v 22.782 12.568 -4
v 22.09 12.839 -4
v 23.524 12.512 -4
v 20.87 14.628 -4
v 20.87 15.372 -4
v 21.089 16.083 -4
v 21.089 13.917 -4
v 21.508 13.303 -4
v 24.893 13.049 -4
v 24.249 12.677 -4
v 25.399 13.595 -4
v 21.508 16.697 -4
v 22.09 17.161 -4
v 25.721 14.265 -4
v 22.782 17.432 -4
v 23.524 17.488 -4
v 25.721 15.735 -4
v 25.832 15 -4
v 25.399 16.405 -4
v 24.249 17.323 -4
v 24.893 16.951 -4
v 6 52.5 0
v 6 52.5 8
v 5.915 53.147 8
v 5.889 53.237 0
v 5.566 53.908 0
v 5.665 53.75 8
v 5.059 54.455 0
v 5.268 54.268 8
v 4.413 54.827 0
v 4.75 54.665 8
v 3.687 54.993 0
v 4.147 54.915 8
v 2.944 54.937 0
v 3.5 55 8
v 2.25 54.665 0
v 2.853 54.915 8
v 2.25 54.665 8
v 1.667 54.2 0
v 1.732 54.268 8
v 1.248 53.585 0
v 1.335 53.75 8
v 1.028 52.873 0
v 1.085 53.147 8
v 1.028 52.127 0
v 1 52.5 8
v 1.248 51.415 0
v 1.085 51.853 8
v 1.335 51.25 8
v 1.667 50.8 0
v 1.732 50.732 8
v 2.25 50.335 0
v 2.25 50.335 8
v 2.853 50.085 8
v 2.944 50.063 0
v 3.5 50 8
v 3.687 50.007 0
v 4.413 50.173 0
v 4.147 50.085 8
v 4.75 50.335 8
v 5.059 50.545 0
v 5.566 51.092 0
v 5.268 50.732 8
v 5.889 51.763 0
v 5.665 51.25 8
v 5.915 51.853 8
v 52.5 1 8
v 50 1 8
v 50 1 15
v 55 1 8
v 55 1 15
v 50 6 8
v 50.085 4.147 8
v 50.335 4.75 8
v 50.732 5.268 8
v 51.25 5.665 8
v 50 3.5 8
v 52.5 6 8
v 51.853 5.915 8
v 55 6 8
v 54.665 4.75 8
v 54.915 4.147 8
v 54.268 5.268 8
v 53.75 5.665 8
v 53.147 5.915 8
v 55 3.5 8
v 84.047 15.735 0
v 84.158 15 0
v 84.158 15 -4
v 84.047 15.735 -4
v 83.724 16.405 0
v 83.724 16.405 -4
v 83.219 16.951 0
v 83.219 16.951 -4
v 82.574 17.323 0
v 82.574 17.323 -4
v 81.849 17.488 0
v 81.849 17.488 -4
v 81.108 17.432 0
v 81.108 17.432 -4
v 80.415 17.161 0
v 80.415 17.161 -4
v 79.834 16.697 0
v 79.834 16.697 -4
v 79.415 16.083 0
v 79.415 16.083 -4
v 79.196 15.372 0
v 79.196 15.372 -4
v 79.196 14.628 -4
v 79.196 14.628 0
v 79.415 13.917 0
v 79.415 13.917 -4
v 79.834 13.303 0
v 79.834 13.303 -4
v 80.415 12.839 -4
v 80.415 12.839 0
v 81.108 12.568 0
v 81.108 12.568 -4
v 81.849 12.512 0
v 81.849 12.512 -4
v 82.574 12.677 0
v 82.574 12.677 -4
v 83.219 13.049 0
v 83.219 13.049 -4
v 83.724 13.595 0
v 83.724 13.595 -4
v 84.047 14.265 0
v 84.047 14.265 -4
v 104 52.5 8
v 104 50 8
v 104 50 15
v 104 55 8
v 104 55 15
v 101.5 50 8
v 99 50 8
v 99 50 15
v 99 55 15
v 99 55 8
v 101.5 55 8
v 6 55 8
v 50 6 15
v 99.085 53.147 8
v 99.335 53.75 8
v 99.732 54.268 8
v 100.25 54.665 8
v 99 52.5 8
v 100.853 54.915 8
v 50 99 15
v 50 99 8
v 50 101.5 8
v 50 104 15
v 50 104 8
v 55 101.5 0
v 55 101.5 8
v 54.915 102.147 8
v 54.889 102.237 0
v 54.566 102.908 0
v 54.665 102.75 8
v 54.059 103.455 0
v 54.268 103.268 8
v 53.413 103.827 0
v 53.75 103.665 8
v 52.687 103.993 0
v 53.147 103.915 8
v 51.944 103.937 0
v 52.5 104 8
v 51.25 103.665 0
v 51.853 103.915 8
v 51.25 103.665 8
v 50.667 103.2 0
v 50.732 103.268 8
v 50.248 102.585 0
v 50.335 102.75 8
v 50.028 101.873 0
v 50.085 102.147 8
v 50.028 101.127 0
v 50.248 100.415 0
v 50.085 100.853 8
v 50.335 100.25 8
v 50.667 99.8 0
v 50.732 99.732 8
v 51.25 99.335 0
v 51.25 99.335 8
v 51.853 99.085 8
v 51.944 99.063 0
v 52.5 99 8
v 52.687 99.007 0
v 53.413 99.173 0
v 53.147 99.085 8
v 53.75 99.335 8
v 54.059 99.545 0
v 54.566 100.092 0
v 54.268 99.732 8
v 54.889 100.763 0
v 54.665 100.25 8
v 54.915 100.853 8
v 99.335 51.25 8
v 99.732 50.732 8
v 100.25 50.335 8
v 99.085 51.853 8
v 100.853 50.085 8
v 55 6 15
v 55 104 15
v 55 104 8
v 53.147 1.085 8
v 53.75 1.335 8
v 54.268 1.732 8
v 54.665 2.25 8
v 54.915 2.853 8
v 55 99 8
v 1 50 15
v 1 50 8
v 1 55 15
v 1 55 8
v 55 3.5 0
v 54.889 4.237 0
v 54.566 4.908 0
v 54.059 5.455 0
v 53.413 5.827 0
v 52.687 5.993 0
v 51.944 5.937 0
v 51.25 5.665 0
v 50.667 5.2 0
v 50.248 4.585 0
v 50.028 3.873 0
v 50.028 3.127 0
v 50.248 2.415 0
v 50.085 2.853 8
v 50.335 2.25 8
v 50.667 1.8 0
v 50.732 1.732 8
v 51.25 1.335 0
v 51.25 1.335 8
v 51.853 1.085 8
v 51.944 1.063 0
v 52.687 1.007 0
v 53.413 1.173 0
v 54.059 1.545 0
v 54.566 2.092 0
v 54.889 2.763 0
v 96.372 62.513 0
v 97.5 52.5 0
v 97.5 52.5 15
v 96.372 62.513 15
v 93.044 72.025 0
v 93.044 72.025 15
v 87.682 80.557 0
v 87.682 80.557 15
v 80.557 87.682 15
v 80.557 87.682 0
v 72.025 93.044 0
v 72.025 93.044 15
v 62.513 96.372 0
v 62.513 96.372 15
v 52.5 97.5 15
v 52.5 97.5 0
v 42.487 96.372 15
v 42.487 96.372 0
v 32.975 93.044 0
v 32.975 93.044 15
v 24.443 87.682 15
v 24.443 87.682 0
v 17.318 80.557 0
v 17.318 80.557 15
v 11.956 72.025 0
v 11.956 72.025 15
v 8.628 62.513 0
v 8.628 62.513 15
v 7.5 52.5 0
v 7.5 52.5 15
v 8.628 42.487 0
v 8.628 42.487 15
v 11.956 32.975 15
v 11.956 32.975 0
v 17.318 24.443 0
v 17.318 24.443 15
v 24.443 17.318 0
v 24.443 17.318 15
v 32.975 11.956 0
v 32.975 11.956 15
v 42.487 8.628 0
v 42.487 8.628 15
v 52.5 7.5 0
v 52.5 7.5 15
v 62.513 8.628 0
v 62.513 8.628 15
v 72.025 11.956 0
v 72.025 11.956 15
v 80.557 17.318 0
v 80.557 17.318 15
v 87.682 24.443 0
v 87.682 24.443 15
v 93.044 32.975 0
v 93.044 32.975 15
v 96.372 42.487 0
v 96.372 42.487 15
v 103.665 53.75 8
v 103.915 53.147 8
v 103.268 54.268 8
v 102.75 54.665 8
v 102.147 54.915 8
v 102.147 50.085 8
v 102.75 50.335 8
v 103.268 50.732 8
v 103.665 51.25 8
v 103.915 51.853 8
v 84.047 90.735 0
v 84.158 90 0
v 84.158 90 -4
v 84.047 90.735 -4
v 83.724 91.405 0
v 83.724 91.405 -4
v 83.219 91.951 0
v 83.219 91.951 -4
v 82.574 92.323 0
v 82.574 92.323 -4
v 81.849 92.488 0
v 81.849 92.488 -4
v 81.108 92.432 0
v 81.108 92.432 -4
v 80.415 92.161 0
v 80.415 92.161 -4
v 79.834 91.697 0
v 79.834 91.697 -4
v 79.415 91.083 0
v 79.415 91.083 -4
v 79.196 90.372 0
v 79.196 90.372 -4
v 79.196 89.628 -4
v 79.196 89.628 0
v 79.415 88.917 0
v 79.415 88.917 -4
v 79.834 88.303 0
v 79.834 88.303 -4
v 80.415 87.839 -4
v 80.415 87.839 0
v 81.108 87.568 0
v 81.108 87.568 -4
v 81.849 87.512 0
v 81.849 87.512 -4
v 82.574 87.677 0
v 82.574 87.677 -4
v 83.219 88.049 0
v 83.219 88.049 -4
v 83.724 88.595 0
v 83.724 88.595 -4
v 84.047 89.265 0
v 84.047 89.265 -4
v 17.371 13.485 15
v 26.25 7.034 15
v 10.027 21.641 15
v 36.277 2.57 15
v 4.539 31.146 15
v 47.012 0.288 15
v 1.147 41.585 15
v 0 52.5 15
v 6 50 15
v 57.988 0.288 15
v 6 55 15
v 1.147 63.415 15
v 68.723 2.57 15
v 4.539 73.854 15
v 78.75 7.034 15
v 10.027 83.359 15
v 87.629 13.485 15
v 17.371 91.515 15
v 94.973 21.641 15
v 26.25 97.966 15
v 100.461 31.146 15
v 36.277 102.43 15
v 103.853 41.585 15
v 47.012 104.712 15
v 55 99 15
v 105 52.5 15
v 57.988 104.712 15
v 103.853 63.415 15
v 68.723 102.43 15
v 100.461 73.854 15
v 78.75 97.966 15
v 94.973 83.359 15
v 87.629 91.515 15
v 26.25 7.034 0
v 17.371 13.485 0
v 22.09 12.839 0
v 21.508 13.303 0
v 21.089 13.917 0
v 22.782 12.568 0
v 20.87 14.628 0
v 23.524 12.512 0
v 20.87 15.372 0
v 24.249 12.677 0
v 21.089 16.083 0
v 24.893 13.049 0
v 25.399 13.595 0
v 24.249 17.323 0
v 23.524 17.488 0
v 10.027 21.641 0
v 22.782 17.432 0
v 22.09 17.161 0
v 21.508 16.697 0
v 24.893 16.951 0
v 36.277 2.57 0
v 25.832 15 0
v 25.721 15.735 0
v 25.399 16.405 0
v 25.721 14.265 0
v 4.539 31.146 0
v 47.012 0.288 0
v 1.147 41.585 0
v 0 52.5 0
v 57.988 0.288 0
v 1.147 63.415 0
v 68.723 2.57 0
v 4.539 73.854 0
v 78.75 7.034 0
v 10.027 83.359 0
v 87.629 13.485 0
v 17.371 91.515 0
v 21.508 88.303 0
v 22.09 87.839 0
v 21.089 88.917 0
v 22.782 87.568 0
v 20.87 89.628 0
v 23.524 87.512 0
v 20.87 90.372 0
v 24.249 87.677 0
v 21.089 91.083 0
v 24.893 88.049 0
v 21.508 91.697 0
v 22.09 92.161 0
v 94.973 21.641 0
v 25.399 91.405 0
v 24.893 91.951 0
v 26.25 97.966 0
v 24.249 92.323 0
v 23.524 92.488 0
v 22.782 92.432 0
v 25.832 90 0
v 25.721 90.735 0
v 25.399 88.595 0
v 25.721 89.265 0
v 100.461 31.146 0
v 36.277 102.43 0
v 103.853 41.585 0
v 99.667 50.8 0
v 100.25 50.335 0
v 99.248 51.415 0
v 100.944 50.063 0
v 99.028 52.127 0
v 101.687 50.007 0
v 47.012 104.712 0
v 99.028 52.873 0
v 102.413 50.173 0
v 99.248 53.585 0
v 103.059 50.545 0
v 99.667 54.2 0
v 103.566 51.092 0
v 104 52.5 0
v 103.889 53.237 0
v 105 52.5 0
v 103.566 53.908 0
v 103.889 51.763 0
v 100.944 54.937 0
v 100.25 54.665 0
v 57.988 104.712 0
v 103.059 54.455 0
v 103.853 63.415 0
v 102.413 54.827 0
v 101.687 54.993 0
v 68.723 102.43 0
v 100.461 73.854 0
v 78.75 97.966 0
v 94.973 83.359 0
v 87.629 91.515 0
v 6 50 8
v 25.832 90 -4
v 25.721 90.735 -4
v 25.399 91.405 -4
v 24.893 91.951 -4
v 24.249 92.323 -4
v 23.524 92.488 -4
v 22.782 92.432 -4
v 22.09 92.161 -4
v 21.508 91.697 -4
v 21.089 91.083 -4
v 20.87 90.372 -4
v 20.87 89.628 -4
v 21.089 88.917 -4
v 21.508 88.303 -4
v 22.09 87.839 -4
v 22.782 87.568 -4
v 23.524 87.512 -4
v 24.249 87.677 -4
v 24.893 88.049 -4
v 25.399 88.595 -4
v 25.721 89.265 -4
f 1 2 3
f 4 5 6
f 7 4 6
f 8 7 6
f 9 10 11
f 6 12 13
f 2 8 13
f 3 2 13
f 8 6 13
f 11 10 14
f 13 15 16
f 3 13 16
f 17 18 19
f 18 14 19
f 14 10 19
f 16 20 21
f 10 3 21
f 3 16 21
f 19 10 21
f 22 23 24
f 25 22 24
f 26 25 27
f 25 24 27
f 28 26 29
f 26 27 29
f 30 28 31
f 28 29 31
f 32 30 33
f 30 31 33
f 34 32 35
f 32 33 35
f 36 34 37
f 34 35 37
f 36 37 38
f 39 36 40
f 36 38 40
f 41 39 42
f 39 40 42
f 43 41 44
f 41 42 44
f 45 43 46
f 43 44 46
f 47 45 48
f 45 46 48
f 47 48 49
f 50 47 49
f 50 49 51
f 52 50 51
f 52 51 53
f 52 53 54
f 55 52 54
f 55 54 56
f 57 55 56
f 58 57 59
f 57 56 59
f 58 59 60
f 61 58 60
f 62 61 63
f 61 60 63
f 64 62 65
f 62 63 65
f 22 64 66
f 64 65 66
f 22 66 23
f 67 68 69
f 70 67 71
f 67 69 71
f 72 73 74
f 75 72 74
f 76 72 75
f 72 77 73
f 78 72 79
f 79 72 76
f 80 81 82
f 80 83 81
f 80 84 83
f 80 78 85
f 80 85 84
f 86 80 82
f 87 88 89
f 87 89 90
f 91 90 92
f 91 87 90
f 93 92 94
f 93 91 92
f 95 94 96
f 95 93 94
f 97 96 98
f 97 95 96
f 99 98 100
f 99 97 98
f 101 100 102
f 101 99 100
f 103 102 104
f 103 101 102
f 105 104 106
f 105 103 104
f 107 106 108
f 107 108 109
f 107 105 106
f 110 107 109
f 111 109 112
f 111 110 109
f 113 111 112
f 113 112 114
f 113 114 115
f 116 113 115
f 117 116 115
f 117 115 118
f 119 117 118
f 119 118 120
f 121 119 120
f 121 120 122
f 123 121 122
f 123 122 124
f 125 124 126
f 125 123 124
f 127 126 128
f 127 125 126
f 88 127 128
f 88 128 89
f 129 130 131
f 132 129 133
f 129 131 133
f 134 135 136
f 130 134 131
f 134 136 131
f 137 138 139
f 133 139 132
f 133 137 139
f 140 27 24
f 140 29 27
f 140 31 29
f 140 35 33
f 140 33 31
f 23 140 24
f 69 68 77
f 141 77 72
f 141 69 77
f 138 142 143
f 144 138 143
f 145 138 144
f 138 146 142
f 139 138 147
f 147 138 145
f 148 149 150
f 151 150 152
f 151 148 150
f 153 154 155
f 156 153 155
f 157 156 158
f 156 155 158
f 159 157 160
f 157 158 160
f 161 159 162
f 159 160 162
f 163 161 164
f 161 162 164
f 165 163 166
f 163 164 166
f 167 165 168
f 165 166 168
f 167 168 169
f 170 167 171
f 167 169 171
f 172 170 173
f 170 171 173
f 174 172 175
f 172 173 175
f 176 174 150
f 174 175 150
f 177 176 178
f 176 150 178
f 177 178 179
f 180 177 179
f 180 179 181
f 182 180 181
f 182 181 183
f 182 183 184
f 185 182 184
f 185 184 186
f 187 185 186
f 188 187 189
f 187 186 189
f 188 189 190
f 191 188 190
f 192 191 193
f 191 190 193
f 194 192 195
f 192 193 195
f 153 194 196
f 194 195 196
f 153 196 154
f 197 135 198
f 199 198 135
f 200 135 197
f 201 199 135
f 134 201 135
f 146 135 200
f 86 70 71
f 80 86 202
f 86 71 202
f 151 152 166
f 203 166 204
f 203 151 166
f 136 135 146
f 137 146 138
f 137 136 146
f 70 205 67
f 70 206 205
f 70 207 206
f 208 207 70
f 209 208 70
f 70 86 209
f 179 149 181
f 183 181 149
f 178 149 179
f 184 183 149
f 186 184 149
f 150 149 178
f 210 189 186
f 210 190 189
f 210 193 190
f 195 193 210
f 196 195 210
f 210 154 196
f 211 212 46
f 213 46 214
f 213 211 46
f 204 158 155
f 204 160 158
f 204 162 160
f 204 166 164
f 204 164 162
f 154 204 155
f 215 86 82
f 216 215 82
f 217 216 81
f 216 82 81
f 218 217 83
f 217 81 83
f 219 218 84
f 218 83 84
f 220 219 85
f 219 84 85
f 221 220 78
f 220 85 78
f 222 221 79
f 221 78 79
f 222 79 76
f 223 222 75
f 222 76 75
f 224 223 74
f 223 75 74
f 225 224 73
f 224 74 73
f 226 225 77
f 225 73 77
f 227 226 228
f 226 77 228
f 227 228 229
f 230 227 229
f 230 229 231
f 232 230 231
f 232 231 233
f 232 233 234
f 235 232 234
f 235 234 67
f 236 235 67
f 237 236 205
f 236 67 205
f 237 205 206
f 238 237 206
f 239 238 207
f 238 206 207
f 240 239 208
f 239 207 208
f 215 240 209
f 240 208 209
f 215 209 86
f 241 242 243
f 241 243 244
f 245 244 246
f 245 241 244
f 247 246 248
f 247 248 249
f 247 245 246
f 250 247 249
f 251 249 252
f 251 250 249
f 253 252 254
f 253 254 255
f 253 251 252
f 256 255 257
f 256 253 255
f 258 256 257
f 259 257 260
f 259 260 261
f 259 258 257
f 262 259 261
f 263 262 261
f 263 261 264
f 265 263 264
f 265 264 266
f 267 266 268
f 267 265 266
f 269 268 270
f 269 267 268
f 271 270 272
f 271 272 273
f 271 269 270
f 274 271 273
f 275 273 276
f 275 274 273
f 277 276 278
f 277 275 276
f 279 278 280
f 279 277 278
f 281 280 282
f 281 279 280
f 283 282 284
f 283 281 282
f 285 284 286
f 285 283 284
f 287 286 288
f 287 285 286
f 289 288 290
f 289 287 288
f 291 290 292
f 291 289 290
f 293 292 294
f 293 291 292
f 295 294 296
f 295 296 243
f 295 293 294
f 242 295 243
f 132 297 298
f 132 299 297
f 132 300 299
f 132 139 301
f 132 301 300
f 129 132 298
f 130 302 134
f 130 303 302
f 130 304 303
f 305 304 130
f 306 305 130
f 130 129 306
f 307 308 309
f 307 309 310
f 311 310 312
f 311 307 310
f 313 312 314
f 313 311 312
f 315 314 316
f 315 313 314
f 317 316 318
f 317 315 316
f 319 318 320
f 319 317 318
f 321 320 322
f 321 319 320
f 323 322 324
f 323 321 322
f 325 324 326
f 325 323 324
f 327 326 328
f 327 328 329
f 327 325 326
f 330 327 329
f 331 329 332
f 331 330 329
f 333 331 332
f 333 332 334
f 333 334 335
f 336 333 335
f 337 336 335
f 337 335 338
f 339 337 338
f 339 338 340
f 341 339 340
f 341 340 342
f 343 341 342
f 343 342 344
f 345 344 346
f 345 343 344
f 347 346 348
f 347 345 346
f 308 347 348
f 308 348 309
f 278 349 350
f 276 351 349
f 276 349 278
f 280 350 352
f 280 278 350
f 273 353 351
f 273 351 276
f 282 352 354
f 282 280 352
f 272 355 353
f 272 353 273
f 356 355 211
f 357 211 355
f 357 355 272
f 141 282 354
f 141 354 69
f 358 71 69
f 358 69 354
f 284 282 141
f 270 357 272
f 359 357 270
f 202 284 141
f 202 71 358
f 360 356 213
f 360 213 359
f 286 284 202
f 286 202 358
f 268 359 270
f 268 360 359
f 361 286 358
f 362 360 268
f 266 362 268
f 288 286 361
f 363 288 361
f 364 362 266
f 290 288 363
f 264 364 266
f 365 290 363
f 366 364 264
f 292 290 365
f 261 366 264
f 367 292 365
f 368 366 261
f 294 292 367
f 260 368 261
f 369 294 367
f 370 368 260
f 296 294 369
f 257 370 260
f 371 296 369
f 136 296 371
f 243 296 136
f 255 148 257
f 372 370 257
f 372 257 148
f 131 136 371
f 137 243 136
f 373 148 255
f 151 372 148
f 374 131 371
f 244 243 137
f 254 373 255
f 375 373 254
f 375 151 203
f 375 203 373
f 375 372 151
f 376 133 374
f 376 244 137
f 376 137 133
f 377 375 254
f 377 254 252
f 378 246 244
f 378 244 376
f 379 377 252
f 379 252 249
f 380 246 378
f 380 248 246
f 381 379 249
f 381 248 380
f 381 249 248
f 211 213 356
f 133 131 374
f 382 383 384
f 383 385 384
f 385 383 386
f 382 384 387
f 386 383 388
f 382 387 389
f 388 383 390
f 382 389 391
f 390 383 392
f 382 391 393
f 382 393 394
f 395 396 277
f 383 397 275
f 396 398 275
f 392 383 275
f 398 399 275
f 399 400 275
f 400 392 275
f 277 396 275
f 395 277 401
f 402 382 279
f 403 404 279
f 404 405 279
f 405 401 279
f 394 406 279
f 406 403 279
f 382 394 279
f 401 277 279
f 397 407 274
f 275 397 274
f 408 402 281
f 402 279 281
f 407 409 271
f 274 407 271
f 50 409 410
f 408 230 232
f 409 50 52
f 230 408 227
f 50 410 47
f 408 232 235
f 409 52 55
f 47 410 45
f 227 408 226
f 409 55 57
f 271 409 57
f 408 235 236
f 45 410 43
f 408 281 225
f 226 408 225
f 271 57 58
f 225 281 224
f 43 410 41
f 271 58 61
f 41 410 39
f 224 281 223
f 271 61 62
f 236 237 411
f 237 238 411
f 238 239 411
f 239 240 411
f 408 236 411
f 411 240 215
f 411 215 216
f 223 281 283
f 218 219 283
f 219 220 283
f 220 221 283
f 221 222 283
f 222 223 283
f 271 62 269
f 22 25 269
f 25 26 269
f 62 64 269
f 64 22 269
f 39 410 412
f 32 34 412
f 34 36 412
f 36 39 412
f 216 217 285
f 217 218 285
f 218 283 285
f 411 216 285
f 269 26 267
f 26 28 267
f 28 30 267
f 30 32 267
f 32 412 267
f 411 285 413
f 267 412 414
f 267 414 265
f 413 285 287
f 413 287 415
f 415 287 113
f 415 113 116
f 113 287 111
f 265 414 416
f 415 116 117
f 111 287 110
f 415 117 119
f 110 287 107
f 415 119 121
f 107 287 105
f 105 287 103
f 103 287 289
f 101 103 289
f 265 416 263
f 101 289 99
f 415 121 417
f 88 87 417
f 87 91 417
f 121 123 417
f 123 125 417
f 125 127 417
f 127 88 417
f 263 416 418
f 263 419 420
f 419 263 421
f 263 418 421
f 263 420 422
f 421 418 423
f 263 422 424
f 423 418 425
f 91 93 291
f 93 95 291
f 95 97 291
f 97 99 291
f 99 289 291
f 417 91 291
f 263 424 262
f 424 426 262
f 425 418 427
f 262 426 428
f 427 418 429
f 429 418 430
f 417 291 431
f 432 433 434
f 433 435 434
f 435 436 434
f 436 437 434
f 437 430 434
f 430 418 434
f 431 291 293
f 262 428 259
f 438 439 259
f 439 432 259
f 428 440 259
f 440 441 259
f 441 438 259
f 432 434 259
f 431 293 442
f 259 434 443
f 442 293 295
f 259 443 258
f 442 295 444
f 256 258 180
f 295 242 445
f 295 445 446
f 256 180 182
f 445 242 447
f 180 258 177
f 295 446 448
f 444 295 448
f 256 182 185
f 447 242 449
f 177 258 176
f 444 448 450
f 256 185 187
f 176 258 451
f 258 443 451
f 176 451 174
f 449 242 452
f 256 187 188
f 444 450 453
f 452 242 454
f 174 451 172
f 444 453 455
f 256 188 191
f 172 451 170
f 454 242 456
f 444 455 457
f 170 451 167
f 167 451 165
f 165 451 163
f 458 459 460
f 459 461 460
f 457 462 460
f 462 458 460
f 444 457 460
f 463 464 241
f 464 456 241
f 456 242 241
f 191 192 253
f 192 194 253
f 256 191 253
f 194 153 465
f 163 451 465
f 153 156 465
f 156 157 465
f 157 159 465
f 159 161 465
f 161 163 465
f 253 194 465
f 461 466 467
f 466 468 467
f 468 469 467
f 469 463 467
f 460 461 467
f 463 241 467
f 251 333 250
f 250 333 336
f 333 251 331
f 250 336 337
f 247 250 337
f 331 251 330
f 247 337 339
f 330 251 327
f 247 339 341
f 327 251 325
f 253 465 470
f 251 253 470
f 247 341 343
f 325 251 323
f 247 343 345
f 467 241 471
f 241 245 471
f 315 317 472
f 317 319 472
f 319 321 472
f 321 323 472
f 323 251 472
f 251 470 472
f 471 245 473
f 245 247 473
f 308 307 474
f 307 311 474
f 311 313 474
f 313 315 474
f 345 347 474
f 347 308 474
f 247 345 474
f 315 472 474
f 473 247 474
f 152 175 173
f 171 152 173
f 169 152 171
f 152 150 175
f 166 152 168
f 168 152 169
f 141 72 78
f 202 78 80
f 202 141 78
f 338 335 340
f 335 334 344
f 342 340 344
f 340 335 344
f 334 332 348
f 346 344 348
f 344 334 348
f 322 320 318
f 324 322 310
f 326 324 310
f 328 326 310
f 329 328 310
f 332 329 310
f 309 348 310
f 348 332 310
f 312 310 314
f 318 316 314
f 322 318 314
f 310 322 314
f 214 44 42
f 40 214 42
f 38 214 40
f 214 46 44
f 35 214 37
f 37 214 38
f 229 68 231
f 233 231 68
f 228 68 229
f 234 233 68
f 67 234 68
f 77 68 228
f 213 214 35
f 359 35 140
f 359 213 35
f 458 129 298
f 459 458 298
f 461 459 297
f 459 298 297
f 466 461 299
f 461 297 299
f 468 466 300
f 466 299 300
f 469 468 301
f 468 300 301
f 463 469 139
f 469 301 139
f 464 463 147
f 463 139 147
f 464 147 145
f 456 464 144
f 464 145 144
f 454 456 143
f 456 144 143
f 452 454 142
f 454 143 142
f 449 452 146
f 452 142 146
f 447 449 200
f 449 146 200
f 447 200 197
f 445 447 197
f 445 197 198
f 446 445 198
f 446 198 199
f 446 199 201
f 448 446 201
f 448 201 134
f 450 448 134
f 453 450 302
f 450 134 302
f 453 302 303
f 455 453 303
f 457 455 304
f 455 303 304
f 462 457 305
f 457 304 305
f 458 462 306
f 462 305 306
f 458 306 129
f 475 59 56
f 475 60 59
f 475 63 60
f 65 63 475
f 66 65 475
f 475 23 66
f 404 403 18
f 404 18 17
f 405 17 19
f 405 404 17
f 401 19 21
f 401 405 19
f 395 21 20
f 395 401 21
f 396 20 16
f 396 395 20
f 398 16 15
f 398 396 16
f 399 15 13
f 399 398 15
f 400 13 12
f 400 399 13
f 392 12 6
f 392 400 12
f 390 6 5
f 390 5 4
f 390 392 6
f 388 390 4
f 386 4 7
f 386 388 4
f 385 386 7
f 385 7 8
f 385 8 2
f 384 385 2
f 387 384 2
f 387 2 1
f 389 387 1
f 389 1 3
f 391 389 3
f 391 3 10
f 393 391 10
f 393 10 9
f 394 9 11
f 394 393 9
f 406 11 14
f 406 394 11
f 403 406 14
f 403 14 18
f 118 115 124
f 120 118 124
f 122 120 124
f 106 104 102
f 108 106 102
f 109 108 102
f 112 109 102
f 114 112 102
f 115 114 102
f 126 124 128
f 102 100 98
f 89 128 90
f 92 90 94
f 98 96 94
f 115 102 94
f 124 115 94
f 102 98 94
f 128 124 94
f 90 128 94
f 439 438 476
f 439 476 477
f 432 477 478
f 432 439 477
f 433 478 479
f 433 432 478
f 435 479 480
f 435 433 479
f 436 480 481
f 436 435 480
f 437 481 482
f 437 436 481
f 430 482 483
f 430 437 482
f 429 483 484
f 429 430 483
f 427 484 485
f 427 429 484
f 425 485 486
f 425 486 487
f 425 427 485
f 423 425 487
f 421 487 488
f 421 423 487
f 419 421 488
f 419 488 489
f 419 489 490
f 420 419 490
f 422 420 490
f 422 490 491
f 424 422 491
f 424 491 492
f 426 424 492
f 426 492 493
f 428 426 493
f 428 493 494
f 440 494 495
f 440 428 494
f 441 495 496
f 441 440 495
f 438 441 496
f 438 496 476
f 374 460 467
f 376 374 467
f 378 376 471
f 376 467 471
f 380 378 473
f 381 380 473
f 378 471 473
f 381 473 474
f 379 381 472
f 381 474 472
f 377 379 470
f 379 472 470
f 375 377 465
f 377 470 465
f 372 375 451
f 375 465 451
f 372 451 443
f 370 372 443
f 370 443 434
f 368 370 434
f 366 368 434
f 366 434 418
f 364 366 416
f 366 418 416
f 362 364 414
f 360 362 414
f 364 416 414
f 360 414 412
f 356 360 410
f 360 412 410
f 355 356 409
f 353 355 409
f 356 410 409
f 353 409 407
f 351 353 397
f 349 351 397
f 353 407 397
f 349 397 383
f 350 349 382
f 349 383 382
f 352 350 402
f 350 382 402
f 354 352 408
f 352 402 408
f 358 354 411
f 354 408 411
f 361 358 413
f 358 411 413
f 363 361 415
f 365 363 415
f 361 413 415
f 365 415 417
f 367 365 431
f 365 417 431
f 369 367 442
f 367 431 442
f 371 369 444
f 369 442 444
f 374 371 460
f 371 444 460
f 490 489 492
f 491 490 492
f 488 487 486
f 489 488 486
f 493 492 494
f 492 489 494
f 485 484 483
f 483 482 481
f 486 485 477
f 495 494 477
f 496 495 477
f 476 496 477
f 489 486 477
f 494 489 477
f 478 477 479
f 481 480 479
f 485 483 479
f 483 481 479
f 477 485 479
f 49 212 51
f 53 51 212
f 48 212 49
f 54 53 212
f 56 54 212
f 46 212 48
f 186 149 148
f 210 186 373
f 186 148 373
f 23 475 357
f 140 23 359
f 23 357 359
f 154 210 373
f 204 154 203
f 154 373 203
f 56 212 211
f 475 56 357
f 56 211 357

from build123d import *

# Parameters (mm, degrees)
SKETCH_R        = 52.5
SKETCH_R_2      = 45
PAD_DEPTH       = 15
SKETCH001_W     = 5
SKETCH001_H     = 5
POCKET001_DEPTH = 7
SKETCH002_R     = 2.5
HOLE_DEPTH      = 15.001
SKETCH012_R     = 2.495
PAD005_DEPTH    = 4


with BuildPart() as part:
    # Sketch → Pad (new body)
    with BuildSketch(Plane.XY):
        with Locations((52.5, 52.5)):
            Circle(SKETCH_R)
        with Locations((52.5, 52.5)):
            Circle(SKETCH_R_2, mode=Mode.SUBTRACT)
    extrude(amount=PAD_DEPTH)

    # Sketch001 (on Face4 of Pad) → Pocket001 (cut)
    with BuildSketch(Plane.XY.offset(15)):
        with Locations((3.5, 52.5)):
            Rectangle(SKETCH001_W, SKETCH001_H)
        with Locations((52.5, 3.5)):
            Rectangle(SKETCH001_W, SKETCH001_H)
        with Locations((101.5, 52.5)):
            Rectangle(SKETCH001_W, SKETCH001_H)
        with Locations((52.5, 101.5)):
            Rectangle(SKETCH001_W, SKETCH001_H)
    extrude(amount=-POCKET001_DEPTH, mode=Mode.SUBTRACT)

    # Sketch002 (on Face3 of Pocket001) → Hole (cut, through all)
    with BuildSketch(Plane.XY.offset(15)):
        with Locations((52.5, 101.5)):
            Circle(SKETCH002_R)
        with Locations((52.5, 3.5)):
            Circle(SKETCH002_R)
        with Locations((3.5, 52.5)):
            Circle(SKETCH002_R)
        with Locations((101.5, 52.5)):
            Circle(SKETCH002_R)
    extrude(amount=-HOLE_DEPTH, mode=Mode.SUBTRACT)

    # Sketch012 → Pad005 (join)
    with BuildSketch(Plane.XY):
        with Locations((81.6629049479, 90)):
            Circle(SKETCH012_R)
        with Locations((81.6629049479, 15)):
            Circle(SKETCH012_R)
        with Locations((23.3370950521, 90)):
            Circle(SKETCH012_R)
        with Locations((23.3370950521, 15)):
            Circle(SKETCH012_R)
    extrude(amount=-PAD005_DEPTH)


solid = part.part
